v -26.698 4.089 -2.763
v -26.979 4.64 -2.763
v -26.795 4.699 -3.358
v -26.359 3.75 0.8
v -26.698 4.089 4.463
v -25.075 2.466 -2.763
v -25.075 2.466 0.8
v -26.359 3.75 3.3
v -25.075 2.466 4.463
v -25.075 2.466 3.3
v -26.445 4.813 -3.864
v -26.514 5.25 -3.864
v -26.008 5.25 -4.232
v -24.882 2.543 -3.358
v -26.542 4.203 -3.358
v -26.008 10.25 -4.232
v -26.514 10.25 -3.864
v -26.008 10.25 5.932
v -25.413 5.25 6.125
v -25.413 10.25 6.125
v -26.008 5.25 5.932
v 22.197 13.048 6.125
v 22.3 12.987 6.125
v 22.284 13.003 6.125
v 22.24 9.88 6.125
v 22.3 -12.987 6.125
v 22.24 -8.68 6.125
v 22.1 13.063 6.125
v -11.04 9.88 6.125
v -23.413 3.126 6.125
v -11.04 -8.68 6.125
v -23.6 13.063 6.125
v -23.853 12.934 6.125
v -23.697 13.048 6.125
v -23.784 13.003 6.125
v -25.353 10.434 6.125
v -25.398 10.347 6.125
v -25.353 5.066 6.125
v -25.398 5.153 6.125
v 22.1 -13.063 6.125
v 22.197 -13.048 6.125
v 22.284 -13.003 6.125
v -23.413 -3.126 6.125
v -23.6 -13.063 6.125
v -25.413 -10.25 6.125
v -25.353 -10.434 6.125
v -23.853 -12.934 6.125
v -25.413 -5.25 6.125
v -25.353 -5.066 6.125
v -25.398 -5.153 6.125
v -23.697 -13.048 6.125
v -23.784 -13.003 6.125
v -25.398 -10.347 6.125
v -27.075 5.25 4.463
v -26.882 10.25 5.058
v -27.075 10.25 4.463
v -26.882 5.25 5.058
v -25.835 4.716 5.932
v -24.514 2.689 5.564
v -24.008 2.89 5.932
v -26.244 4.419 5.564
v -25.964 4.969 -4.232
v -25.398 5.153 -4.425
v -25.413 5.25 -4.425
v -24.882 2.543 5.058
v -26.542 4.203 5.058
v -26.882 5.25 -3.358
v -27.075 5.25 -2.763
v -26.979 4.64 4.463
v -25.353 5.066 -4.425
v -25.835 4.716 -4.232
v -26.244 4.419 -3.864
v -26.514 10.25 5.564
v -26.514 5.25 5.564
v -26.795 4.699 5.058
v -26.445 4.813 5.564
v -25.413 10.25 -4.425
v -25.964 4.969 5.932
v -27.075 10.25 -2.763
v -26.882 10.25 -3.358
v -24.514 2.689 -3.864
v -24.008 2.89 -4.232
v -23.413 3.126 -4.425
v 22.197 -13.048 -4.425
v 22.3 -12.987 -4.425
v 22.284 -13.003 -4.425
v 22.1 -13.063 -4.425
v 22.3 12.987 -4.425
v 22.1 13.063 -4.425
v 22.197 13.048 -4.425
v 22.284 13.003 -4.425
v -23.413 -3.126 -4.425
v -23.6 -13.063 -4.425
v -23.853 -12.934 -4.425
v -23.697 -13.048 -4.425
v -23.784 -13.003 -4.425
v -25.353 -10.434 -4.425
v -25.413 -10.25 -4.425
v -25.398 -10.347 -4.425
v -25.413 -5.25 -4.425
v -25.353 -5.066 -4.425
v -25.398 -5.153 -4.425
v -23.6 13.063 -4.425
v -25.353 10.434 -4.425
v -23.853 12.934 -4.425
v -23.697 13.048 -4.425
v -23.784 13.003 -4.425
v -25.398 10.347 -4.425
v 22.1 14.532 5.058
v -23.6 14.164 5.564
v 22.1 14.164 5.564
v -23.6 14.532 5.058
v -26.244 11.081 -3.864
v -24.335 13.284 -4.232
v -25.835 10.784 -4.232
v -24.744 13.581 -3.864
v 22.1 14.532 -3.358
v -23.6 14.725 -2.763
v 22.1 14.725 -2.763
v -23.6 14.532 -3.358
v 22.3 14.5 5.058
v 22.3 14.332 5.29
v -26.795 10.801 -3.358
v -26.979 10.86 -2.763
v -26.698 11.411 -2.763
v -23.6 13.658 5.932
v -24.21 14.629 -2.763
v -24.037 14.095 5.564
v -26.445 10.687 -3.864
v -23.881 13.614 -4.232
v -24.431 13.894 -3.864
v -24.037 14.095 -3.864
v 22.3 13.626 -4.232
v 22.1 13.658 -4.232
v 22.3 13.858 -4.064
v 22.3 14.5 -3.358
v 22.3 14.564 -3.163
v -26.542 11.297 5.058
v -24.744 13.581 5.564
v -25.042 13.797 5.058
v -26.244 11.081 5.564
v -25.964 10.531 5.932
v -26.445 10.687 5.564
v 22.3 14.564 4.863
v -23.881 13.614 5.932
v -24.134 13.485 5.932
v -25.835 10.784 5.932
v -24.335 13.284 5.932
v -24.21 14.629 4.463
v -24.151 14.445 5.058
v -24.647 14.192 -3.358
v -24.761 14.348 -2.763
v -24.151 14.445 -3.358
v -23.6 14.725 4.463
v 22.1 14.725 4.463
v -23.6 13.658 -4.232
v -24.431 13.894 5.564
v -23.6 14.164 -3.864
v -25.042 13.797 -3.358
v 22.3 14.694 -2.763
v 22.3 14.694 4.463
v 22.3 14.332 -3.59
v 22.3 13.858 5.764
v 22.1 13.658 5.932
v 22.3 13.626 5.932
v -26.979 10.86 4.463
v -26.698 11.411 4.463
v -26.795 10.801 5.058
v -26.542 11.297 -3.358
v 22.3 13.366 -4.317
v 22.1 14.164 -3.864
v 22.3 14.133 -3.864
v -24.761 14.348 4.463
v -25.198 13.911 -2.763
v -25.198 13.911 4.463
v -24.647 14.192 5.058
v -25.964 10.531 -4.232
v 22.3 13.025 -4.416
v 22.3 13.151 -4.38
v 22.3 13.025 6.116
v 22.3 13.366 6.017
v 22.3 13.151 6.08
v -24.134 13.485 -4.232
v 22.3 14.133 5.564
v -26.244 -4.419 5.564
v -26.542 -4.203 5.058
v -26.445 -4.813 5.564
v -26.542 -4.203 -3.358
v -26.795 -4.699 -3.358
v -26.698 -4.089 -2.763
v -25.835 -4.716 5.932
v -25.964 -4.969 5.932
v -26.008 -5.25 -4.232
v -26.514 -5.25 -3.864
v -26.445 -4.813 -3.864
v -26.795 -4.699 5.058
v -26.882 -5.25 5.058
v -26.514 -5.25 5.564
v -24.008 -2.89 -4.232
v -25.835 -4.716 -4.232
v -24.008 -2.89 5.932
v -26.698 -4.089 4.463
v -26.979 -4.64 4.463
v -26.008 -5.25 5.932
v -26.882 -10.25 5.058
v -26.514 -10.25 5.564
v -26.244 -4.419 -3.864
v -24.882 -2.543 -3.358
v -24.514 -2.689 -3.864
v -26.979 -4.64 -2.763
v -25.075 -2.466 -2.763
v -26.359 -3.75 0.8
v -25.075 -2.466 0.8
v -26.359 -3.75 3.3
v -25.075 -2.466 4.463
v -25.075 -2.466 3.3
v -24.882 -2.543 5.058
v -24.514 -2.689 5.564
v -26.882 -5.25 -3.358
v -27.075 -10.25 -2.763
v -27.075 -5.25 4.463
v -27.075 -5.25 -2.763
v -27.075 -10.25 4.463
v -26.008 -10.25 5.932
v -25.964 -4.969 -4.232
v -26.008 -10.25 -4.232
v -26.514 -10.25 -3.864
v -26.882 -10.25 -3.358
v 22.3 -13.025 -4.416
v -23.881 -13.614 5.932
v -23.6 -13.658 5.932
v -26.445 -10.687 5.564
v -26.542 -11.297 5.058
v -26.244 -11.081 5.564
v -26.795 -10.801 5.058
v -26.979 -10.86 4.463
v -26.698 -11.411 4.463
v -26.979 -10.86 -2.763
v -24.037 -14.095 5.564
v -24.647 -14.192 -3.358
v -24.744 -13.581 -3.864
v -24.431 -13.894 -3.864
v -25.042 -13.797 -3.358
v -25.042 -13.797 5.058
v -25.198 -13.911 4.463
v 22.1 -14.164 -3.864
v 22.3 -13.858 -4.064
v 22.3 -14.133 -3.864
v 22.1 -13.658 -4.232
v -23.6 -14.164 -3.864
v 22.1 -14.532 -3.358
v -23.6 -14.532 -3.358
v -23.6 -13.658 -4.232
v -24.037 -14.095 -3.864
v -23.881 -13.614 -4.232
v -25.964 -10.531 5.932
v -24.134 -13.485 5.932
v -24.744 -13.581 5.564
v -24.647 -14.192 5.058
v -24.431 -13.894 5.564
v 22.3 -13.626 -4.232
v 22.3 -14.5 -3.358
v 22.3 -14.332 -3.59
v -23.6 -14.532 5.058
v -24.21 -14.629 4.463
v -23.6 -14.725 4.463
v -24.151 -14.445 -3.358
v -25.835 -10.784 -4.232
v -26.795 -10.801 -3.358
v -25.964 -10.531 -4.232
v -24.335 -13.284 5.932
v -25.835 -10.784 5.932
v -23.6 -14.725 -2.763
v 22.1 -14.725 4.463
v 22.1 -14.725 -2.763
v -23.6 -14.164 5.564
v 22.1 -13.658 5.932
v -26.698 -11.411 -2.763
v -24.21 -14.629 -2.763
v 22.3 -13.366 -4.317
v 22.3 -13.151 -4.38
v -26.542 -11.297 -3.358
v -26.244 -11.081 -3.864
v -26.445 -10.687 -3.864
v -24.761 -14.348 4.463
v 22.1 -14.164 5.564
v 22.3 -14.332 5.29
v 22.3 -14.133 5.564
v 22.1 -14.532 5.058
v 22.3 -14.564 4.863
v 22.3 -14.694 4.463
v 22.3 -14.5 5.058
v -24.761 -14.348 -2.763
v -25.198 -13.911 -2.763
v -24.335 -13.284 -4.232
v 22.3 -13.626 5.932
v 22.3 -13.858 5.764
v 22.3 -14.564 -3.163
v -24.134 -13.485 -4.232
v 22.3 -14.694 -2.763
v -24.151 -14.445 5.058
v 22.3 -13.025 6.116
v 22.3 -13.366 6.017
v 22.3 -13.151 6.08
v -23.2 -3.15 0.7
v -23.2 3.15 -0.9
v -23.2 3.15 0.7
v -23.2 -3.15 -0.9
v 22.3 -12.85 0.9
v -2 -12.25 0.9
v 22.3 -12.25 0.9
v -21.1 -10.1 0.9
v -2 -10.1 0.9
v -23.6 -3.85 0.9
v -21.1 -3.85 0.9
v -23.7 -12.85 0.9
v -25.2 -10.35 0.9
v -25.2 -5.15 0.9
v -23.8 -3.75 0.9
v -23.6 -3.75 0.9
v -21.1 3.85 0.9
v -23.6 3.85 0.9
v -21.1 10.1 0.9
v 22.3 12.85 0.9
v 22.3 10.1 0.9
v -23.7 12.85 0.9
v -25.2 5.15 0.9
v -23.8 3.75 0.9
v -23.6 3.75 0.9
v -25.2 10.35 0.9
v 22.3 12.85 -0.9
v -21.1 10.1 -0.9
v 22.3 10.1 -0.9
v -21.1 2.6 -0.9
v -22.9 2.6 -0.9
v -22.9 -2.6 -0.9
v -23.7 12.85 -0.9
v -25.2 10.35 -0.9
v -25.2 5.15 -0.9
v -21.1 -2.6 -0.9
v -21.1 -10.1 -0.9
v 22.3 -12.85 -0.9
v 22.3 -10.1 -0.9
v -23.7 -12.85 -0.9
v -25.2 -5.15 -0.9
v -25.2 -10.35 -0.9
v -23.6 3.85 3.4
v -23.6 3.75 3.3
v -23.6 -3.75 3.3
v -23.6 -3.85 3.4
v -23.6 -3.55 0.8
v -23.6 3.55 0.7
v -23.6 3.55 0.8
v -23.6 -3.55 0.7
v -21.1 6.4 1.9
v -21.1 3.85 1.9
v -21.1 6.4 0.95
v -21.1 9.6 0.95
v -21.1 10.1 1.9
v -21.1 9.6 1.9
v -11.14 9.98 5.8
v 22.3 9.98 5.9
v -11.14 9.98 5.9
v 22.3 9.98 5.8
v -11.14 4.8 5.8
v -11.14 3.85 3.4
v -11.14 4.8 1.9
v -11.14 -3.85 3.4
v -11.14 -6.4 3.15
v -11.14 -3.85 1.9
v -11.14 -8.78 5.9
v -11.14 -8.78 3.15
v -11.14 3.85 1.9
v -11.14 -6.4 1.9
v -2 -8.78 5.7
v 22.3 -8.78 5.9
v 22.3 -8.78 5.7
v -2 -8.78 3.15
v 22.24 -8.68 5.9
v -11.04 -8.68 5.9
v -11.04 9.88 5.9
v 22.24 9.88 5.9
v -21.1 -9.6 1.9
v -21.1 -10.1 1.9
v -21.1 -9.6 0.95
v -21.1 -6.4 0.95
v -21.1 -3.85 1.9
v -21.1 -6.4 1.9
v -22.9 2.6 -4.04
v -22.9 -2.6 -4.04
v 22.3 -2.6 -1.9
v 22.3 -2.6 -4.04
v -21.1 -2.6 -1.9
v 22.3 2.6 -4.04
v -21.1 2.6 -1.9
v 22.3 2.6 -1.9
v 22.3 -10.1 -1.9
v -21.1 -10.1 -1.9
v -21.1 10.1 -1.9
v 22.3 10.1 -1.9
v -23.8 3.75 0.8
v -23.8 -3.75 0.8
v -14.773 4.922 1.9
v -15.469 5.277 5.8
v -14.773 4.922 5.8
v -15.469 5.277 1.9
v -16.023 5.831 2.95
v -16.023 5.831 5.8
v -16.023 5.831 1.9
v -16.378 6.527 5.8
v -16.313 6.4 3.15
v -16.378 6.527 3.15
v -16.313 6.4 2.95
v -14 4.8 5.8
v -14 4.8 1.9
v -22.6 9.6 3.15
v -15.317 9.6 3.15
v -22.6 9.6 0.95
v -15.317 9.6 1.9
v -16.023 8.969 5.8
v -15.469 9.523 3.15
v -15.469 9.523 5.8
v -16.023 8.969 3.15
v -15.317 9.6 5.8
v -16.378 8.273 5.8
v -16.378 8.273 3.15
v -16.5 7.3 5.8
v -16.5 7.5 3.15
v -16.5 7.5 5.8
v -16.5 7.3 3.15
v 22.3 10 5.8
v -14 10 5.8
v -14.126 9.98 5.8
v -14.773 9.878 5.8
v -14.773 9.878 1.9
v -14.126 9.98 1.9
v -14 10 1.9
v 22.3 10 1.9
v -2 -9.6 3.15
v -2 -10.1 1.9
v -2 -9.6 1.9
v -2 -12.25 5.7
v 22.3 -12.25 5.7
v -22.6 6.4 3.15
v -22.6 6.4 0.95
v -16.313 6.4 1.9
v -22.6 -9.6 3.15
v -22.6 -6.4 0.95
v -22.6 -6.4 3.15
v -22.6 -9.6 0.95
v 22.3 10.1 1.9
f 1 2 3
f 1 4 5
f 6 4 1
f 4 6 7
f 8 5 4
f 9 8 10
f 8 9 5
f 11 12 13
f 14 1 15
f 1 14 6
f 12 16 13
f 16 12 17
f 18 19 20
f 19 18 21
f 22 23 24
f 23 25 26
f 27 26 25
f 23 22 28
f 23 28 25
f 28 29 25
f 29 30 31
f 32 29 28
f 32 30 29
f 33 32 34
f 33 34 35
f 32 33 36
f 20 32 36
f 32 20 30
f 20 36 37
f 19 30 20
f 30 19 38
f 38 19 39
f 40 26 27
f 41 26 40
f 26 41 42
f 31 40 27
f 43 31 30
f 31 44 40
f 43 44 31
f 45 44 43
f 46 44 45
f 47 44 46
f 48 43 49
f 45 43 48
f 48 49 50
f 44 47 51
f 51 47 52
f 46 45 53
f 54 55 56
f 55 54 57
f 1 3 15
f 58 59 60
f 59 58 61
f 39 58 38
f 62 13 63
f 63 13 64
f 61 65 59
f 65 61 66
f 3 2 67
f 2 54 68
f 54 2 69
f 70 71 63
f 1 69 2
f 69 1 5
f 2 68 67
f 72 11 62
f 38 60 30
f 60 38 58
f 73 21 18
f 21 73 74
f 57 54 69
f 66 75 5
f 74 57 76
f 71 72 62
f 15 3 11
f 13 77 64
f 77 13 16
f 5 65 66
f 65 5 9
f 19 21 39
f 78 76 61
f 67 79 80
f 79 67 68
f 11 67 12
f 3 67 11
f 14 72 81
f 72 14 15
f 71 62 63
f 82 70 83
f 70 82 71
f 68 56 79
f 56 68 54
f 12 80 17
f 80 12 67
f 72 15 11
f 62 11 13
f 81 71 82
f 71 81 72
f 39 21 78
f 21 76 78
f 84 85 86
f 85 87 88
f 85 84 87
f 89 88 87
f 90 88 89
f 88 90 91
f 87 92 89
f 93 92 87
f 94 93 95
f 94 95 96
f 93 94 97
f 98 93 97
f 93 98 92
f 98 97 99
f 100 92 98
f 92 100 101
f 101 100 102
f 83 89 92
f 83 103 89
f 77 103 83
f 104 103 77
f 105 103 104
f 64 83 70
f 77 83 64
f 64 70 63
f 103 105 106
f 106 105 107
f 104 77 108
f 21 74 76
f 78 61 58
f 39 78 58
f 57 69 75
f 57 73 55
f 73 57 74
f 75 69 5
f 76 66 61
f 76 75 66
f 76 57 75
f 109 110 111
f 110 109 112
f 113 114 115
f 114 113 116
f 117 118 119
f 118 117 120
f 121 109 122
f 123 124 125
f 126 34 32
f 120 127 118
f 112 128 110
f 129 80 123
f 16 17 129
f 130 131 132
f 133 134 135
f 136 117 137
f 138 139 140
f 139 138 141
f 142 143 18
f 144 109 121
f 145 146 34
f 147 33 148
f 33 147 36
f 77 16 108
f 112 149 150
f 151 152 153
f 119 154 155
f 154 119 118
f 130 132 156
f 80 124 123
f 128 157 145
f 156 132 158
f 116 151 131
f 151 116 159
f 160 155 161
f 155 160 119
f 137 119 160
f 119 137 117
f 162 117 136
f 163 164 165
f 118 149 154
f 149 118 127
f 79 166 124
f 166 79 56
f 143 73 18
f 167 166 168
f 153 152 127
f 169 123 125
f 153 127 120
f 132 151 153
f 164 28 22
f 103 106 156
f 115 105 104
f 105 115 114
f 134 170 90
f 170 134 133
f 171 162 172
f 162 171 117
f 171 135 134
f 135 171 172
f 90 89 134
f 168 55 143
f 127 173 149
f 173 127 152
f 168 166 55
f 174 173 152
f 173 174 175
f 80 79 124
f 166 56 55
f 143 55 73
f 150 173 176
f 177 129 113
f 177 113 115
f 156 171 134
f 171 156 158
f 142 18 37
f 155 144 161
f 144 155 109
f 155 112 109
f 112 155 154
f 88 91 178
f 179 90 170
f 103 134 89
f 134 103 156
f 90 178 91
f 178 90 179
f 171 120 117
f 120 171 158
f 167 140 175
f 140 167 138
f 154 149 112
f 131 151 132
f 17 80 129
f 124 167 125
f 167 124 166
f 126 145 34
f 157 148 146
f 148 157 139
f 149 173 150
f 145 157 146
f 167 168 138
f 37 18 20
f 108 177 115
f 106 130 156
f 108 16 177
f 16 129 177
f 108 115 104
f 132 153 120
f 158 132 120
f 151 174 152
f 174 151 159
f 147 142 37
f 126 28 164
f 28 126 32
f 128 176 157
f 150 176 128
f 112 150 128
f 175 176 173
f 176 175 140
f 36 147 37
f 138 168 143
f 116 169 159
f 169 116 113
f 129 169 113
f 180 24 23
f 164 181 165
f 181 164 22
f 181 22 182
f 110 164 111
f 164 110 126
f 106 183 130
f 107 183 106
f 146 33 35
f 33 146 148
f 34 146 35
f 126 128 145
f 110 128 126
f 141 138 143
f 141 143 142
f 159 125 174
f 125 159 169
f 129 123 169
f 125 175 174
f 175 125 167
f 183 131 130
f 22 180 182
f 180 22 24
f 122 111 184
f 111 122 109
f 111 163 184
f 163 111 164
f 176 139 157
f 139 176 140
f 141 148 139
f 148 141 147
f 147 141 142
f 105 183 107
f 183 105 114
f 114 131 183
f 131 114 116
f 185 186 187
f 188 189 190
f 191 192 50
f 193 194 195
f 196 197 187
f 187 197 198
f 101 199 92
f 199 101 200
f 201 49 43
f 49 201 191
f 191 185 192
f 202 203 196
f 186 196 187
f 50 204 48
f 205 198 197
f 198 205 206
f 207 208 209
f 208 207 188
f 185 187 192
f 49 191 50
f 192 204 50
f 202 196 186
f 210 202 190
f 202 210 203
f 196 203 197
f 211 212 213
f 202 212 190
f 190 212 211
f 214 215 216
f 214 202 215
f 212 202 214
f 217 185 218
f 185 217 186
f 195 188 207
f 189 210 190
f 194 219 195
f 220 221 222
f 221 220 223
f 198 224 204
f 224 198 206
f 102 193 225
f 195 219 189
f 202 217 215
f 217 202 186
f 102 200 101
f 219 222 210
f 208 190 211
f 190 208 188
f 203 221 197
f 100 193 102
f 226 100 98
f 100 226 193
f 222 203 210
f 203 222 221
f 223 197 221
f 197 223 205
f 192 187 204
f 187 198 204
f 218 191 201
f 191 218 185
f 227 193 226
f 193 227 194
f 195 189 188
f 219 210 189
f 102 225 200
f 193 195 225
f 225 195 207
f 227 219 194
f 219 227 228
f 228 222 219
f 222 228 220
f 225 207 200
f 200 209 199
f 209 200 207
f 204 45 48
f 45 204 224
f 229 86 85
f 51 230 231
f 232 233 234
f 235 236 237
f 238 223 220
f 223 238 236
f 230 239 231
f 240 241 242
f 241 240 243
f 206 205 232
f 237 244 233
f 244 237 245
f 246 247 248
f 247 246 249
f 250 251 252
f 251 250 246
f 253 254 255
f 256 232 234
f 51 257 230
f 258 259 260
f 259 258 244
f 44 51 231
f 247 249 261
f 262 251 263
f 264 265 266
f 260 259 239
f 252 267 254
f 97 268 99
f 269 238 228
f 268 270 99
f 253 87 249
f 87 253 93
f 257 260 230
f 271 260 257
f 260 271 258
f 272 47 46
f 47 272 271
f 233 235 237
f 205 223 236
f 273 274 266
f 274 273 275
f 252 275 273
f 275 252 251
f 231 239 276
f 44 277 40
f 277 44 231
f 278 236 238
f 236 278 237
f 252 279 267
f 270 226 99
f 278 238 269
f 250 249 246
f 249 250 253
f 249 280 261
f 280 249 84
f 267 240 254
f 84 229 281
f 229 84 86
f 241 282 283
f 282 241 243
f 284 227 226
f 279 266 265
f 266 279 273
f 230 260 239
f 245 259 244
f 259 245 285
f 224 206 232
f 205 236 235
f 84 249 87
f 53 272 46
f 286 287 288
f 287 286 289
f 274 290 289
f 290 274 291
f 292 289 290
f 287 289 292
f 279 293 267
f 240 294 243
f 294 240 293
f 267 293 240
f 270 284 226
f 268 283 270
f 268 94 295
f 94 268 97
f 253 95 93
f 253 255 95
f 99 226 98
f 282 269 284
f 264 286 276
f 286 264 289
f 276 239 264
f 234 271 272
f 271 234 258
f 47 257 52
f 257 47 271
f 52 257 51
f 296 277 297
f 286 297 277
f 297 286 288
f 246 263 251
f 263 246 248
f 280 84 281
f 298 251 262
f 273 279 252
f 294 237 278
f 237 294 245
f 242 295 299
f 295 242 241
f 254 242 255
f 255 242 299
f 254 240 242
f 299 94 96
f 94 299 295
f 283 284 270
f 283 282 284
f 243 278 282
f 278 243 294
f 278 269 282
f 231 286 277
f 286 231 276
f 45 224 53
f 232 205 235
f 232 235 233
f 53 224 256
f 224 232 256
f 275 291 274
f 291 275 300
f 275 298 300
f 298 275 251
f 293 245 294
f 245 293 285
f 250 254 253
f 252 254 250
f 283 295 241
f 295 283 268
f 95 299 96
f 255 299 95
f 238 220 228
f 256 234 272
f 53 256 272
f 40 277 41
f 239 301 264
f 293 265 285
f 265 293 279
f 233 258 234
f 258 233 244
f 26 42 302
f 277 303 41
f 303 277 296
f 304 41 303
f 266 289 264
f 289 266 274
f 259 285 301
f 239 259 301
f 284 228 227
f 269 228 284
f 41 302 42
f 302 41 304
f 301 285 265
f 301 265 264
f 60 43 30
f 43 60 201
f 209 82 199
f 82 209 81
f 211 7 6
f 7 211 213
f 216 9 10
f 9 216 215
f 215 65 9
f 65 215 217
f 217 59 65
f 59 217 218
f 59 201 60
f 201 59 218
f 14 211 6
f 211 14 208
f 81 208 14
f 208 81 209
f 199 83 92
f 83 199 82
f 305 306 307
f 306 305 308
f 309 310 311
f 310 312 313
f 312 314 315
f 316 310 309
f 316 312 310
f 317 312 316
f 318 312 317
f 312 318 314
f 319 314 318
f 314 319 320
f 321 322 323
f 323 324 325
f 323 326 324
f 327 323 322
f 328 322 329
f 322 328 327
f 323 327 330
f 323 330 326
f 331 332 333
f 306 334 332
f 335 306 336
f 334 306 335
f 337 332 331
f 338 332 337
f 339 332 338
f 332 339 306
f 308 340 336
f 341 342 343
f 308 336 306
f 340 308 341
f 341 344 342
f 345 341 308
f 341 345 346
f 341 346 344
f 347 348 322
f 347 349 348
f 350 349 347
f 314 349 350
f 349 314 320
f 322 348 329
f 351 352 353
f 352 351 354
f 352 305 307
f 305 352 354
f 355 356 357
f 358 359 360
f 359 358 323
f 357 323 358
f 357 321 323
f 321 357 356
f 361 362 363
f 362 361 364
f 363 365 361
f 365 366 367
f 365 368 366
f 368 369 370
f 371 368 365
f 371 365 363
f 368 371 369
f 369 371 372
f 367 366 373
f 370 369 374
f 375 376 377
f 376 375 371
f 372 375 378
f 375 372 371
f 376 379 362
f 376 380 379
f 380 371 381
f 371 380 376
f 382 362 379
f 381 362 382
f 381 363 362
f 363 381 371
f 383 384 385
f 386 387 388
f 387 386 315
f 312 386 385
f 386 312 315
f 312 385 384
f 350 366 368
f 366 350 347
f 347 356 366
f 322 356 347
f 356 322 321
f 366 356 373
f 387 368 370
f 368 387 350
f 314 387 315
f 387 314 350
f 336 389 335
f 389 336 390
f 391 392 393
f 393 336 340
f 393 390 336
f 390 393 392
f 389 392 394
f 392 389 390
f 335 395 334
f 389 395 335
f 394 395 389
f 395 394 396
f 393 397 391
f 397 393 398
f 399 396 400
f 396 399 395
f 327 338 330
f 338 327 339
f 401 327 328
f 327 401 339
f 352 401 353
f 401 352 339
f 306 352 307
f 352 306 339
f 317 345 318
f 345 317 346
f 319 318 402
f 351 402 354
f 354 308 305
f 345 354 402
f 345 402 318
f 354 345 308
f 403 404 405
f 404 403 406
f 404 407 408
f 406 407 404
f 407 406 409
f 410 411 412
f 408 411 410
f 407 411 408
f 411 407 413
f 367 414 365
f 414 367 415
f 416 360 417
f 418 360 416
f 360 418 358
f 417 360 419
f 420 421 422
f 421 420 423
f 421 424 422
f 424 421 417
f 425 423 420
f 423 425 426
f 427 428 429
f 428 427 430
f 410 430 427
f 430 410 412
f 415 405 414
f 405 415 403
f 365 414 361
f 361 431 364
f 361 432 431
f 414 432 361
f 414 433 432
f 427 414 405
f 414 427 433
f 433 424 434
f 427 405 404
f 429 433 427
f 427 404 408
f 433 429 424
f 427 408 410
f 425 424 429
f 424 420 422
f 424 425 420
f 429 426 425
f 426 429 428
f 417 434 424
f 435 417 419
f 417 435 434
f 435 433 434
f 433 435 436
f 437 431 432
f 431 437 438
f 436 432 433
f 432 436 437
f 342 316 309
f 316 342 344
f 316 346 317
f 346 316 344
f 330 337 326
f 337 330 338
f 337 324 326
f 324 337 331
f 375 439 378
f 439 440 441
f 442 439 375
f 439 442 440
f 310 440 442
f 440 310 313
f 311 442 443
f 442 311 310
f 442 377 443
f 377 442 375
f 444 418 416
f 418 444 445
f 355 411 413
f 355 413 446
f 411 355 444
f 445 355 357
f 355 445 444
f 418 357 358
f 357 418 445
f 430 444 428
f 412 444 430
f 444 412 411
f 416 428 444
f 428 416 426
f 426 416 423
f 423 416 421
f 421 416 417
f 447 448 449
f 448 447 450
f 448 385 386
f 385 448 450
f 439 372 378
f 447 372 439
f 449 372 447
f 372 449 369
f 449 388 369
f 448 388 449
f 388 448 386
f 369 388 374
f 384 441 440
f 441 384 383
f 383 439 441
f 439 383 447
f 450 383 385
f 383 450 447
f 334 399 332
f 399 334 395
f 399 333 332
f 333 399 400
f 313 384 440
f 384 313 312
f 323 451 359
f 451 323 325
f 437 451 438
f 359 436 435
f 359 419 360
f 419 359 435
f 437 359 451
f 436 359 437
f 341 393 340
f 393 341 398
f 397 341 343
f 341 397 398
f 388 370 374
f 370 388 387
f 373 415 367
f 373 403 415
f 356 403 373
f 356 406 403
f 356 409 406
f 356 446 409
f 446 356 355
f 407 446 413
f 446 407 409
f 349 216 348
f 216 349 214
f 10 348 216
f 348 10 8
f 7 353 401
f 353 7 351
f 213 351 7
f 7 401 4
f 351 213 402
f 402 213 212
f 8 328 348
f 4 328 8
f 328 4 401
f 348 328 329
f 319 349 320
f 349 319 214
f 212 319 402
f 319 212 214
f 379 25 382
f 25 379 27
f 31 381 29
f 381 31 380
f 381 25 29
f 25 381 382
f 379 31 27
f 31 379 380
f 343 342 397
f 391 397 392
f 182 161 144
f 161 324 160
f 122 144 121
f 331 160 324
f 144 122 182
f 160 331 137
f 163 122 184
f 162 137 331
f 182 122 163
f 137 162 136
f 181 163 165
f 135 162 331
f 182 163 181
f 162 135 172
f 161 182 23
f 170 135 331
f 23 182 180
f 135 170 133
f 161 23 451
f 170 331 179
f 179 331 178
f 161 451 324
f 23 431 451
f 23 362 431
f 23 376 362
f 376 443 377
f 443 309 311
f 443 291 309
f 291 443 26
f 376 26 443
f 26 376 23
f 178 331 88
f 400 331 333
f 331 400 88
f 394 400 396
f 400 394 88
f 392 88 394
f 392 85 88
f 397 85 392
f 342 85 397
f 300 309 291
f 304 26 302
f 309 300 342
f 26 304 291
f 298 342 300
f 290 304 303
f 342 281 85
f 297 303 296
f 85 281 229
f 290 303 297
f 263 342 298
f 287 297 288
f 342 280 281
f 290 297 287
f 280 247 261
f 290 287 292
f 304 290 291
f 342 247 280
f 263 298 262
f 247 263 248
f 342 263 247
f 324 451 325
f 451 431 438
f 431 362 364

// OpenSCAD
// file: device_model.scad
pcb_thickness = 1.6;
    
module device() {
    $fn = 20;

    pcb1();
    pcb2();
    pcb3();
    pcb4();
    microusb();
    reset_button();
    program_button();
    oled();
    oled_ribbon();
    wifi_pigtail();
    ipex_connector();
    battery_jack();
    misc();
}

module device_slidex(x) {
    $fn = 20;

    slidex(x) {
        pcb1();
        pcb2();
        pcb3();
        pcb4();
        microusb();
        reset_button();
        program_button();
        oled();
        oled_ribbon();
        wifi_pigtail();
        ipex_connector();
        battery_jack();
        misc();
    }
}

module slidex(x) {
    for (i = [0:1:$children-1]) {
        hull() {
            children(i);
            translate([x,0,0]) {
                children(i);
            }
        }
    }
}

module pcb1() {
    translate([-25.1, -12.75, 0]) {
        linear_extrude(height = pcb_thickness, center = true, convexity = 10) {
            polygon(points=[[2,0],[47.2,0],[47.2,25.5],[2,25.5]]);
        }
    }
}

module pcb2() {
    translate([-25.1, -12.75, 0]) {
        linear_extrude(height = pcb_thickness, center = true, convexity = 10) {
            polygon(points=[[0,2.5],[1.5,0],[2,0],[2,9.5],[0,7.5]]);
        }
    }
}

module pcb3() {    
    translate([-25.1, -12.75, 0]) {
        linear_extrude(height = pcb_thickness, center = true, convexity = 10) {
            polygon(points=[[2,25.5],[1.5,25.5],[0,23],[0,18],[2,16]]);
        }
    }    
}

module pcb4() {
    translate([-25.1, -12.75, 0]) {
        linear_extrude(height = pcb_thickness, center = true, convexity = 10) {
            polygon(points=[[47.2,4.5],[50.2,7.5],[50.2,18],[47.2,21]]);
        }
    }
}

module microusb() {
    translate([-20.5, 0, 2.5/2 + pcb_thickness/2]) {
        cube([6,7.5,2.5], center = true);
    }
}

module reset_button() {
    translate([-20.5, 8, 2.5/2 + pcb_thickness/2]) {
        cube([4,3,2], center = true);
    }
}

module program_button() {
        translate([-20.5, -8, 2.5/2 + pcb_thickness/2]) {
        cube([4,3,2], center = true);
    }
}

module oled() {
    translate([5.6, 0.6, 5/2 + pcb_thickness/2]) {
        cube([33.28,18.56,5], center = true);
    }
}

module oled_ribbon() {
    translate([5.6, -10.4, 4.8/2 + pcb_thickness/2]) {
        cube([15,3.5,4.8], center = true);
    }
}

module wifi_pigtail() {
    translate([-13.9, 7.4, 4.9/2 + pcb_thickness/2]) {
        cylinder(h=4.9, r=2.5, center = true);
    }
}

module ipex_connector() {
    translate([23.8, 0, 1.5/2 + pcb_thickness/2]) {
        cube([2.2,2.2,1.5], center = true);
    }
}

module battery_jack() {
    jack_thickness = 9.74 - 5 - pcb_thickness;
    translate([-20.8, 0, -jack_thickness/2 - pcb_thickness/2]) {
        cube([4,5,jack_thickness], center = true);
    }
}

module misc() {
    cube([42, 20, pcb_thickness + 2], center=true);
}
// file: shell.scad
include <device_model.scad>

module puff(p) {
    minkowski() {
        children();
        cube([p, p, p], center=true);
    }
}

module shell() {
    $fn = 20;

    translate([-25.1, -12.75, 0.85]) {
        minkowski() {
            resize(newsize=[50.2,25.5,6.6]) {
                linear_extrude(height = 1, center = true, convexity = 10) {
                    polygon(points=[[0,2.5],[1.5,0],[47.2,0],[47.2,4.5],[50.2,7.5],[50.2,18],[47.2,21],[47.2,25.5],[1.5,25.5],[0,23],[0,18],[2,16],[2,9.5],[0,7.5]]);
                }
            }
            sphere(2);
        }
    }
}

module ports() {
    // Micro-USB cutout
    translate([-28.5, 0, 2.5/2 + pcb_thickness/2]) {
        cube([14,7.5,2.5], center = true);
    }

    // OLED (extended for cutout)
    translate([5.6, 0.6, 5/2 + pcb_thickness/2 + 2]) {
        cube([33.28,18.56,10], center = true);
    }
    
    // IPEX Connector (extended for cutout)
    translate([25, 0, 1.5/2 + pcb_thickness/2]) {
        cube([5,2.2,1.5], center = true);
    }
}

module shell_slide_bottom() {
    $fn = 20;
    difference() {
        shell();
        puff(0.2) {
            device_slidex(100);
        }
        ports();
    }
}

module shell_slide_top() {
    $fn = 20;
    difference() {
        shell();
        puff(0.2) {
            device_slidex(-100);
        }
        ports();
    }
}
// main file
include <shell.scad>

difference() {
    shell_slide_bottom();
    translate([-7.7+60, 0, 0]) {
        cube([60, 30, 20], center = true);
    }
}
